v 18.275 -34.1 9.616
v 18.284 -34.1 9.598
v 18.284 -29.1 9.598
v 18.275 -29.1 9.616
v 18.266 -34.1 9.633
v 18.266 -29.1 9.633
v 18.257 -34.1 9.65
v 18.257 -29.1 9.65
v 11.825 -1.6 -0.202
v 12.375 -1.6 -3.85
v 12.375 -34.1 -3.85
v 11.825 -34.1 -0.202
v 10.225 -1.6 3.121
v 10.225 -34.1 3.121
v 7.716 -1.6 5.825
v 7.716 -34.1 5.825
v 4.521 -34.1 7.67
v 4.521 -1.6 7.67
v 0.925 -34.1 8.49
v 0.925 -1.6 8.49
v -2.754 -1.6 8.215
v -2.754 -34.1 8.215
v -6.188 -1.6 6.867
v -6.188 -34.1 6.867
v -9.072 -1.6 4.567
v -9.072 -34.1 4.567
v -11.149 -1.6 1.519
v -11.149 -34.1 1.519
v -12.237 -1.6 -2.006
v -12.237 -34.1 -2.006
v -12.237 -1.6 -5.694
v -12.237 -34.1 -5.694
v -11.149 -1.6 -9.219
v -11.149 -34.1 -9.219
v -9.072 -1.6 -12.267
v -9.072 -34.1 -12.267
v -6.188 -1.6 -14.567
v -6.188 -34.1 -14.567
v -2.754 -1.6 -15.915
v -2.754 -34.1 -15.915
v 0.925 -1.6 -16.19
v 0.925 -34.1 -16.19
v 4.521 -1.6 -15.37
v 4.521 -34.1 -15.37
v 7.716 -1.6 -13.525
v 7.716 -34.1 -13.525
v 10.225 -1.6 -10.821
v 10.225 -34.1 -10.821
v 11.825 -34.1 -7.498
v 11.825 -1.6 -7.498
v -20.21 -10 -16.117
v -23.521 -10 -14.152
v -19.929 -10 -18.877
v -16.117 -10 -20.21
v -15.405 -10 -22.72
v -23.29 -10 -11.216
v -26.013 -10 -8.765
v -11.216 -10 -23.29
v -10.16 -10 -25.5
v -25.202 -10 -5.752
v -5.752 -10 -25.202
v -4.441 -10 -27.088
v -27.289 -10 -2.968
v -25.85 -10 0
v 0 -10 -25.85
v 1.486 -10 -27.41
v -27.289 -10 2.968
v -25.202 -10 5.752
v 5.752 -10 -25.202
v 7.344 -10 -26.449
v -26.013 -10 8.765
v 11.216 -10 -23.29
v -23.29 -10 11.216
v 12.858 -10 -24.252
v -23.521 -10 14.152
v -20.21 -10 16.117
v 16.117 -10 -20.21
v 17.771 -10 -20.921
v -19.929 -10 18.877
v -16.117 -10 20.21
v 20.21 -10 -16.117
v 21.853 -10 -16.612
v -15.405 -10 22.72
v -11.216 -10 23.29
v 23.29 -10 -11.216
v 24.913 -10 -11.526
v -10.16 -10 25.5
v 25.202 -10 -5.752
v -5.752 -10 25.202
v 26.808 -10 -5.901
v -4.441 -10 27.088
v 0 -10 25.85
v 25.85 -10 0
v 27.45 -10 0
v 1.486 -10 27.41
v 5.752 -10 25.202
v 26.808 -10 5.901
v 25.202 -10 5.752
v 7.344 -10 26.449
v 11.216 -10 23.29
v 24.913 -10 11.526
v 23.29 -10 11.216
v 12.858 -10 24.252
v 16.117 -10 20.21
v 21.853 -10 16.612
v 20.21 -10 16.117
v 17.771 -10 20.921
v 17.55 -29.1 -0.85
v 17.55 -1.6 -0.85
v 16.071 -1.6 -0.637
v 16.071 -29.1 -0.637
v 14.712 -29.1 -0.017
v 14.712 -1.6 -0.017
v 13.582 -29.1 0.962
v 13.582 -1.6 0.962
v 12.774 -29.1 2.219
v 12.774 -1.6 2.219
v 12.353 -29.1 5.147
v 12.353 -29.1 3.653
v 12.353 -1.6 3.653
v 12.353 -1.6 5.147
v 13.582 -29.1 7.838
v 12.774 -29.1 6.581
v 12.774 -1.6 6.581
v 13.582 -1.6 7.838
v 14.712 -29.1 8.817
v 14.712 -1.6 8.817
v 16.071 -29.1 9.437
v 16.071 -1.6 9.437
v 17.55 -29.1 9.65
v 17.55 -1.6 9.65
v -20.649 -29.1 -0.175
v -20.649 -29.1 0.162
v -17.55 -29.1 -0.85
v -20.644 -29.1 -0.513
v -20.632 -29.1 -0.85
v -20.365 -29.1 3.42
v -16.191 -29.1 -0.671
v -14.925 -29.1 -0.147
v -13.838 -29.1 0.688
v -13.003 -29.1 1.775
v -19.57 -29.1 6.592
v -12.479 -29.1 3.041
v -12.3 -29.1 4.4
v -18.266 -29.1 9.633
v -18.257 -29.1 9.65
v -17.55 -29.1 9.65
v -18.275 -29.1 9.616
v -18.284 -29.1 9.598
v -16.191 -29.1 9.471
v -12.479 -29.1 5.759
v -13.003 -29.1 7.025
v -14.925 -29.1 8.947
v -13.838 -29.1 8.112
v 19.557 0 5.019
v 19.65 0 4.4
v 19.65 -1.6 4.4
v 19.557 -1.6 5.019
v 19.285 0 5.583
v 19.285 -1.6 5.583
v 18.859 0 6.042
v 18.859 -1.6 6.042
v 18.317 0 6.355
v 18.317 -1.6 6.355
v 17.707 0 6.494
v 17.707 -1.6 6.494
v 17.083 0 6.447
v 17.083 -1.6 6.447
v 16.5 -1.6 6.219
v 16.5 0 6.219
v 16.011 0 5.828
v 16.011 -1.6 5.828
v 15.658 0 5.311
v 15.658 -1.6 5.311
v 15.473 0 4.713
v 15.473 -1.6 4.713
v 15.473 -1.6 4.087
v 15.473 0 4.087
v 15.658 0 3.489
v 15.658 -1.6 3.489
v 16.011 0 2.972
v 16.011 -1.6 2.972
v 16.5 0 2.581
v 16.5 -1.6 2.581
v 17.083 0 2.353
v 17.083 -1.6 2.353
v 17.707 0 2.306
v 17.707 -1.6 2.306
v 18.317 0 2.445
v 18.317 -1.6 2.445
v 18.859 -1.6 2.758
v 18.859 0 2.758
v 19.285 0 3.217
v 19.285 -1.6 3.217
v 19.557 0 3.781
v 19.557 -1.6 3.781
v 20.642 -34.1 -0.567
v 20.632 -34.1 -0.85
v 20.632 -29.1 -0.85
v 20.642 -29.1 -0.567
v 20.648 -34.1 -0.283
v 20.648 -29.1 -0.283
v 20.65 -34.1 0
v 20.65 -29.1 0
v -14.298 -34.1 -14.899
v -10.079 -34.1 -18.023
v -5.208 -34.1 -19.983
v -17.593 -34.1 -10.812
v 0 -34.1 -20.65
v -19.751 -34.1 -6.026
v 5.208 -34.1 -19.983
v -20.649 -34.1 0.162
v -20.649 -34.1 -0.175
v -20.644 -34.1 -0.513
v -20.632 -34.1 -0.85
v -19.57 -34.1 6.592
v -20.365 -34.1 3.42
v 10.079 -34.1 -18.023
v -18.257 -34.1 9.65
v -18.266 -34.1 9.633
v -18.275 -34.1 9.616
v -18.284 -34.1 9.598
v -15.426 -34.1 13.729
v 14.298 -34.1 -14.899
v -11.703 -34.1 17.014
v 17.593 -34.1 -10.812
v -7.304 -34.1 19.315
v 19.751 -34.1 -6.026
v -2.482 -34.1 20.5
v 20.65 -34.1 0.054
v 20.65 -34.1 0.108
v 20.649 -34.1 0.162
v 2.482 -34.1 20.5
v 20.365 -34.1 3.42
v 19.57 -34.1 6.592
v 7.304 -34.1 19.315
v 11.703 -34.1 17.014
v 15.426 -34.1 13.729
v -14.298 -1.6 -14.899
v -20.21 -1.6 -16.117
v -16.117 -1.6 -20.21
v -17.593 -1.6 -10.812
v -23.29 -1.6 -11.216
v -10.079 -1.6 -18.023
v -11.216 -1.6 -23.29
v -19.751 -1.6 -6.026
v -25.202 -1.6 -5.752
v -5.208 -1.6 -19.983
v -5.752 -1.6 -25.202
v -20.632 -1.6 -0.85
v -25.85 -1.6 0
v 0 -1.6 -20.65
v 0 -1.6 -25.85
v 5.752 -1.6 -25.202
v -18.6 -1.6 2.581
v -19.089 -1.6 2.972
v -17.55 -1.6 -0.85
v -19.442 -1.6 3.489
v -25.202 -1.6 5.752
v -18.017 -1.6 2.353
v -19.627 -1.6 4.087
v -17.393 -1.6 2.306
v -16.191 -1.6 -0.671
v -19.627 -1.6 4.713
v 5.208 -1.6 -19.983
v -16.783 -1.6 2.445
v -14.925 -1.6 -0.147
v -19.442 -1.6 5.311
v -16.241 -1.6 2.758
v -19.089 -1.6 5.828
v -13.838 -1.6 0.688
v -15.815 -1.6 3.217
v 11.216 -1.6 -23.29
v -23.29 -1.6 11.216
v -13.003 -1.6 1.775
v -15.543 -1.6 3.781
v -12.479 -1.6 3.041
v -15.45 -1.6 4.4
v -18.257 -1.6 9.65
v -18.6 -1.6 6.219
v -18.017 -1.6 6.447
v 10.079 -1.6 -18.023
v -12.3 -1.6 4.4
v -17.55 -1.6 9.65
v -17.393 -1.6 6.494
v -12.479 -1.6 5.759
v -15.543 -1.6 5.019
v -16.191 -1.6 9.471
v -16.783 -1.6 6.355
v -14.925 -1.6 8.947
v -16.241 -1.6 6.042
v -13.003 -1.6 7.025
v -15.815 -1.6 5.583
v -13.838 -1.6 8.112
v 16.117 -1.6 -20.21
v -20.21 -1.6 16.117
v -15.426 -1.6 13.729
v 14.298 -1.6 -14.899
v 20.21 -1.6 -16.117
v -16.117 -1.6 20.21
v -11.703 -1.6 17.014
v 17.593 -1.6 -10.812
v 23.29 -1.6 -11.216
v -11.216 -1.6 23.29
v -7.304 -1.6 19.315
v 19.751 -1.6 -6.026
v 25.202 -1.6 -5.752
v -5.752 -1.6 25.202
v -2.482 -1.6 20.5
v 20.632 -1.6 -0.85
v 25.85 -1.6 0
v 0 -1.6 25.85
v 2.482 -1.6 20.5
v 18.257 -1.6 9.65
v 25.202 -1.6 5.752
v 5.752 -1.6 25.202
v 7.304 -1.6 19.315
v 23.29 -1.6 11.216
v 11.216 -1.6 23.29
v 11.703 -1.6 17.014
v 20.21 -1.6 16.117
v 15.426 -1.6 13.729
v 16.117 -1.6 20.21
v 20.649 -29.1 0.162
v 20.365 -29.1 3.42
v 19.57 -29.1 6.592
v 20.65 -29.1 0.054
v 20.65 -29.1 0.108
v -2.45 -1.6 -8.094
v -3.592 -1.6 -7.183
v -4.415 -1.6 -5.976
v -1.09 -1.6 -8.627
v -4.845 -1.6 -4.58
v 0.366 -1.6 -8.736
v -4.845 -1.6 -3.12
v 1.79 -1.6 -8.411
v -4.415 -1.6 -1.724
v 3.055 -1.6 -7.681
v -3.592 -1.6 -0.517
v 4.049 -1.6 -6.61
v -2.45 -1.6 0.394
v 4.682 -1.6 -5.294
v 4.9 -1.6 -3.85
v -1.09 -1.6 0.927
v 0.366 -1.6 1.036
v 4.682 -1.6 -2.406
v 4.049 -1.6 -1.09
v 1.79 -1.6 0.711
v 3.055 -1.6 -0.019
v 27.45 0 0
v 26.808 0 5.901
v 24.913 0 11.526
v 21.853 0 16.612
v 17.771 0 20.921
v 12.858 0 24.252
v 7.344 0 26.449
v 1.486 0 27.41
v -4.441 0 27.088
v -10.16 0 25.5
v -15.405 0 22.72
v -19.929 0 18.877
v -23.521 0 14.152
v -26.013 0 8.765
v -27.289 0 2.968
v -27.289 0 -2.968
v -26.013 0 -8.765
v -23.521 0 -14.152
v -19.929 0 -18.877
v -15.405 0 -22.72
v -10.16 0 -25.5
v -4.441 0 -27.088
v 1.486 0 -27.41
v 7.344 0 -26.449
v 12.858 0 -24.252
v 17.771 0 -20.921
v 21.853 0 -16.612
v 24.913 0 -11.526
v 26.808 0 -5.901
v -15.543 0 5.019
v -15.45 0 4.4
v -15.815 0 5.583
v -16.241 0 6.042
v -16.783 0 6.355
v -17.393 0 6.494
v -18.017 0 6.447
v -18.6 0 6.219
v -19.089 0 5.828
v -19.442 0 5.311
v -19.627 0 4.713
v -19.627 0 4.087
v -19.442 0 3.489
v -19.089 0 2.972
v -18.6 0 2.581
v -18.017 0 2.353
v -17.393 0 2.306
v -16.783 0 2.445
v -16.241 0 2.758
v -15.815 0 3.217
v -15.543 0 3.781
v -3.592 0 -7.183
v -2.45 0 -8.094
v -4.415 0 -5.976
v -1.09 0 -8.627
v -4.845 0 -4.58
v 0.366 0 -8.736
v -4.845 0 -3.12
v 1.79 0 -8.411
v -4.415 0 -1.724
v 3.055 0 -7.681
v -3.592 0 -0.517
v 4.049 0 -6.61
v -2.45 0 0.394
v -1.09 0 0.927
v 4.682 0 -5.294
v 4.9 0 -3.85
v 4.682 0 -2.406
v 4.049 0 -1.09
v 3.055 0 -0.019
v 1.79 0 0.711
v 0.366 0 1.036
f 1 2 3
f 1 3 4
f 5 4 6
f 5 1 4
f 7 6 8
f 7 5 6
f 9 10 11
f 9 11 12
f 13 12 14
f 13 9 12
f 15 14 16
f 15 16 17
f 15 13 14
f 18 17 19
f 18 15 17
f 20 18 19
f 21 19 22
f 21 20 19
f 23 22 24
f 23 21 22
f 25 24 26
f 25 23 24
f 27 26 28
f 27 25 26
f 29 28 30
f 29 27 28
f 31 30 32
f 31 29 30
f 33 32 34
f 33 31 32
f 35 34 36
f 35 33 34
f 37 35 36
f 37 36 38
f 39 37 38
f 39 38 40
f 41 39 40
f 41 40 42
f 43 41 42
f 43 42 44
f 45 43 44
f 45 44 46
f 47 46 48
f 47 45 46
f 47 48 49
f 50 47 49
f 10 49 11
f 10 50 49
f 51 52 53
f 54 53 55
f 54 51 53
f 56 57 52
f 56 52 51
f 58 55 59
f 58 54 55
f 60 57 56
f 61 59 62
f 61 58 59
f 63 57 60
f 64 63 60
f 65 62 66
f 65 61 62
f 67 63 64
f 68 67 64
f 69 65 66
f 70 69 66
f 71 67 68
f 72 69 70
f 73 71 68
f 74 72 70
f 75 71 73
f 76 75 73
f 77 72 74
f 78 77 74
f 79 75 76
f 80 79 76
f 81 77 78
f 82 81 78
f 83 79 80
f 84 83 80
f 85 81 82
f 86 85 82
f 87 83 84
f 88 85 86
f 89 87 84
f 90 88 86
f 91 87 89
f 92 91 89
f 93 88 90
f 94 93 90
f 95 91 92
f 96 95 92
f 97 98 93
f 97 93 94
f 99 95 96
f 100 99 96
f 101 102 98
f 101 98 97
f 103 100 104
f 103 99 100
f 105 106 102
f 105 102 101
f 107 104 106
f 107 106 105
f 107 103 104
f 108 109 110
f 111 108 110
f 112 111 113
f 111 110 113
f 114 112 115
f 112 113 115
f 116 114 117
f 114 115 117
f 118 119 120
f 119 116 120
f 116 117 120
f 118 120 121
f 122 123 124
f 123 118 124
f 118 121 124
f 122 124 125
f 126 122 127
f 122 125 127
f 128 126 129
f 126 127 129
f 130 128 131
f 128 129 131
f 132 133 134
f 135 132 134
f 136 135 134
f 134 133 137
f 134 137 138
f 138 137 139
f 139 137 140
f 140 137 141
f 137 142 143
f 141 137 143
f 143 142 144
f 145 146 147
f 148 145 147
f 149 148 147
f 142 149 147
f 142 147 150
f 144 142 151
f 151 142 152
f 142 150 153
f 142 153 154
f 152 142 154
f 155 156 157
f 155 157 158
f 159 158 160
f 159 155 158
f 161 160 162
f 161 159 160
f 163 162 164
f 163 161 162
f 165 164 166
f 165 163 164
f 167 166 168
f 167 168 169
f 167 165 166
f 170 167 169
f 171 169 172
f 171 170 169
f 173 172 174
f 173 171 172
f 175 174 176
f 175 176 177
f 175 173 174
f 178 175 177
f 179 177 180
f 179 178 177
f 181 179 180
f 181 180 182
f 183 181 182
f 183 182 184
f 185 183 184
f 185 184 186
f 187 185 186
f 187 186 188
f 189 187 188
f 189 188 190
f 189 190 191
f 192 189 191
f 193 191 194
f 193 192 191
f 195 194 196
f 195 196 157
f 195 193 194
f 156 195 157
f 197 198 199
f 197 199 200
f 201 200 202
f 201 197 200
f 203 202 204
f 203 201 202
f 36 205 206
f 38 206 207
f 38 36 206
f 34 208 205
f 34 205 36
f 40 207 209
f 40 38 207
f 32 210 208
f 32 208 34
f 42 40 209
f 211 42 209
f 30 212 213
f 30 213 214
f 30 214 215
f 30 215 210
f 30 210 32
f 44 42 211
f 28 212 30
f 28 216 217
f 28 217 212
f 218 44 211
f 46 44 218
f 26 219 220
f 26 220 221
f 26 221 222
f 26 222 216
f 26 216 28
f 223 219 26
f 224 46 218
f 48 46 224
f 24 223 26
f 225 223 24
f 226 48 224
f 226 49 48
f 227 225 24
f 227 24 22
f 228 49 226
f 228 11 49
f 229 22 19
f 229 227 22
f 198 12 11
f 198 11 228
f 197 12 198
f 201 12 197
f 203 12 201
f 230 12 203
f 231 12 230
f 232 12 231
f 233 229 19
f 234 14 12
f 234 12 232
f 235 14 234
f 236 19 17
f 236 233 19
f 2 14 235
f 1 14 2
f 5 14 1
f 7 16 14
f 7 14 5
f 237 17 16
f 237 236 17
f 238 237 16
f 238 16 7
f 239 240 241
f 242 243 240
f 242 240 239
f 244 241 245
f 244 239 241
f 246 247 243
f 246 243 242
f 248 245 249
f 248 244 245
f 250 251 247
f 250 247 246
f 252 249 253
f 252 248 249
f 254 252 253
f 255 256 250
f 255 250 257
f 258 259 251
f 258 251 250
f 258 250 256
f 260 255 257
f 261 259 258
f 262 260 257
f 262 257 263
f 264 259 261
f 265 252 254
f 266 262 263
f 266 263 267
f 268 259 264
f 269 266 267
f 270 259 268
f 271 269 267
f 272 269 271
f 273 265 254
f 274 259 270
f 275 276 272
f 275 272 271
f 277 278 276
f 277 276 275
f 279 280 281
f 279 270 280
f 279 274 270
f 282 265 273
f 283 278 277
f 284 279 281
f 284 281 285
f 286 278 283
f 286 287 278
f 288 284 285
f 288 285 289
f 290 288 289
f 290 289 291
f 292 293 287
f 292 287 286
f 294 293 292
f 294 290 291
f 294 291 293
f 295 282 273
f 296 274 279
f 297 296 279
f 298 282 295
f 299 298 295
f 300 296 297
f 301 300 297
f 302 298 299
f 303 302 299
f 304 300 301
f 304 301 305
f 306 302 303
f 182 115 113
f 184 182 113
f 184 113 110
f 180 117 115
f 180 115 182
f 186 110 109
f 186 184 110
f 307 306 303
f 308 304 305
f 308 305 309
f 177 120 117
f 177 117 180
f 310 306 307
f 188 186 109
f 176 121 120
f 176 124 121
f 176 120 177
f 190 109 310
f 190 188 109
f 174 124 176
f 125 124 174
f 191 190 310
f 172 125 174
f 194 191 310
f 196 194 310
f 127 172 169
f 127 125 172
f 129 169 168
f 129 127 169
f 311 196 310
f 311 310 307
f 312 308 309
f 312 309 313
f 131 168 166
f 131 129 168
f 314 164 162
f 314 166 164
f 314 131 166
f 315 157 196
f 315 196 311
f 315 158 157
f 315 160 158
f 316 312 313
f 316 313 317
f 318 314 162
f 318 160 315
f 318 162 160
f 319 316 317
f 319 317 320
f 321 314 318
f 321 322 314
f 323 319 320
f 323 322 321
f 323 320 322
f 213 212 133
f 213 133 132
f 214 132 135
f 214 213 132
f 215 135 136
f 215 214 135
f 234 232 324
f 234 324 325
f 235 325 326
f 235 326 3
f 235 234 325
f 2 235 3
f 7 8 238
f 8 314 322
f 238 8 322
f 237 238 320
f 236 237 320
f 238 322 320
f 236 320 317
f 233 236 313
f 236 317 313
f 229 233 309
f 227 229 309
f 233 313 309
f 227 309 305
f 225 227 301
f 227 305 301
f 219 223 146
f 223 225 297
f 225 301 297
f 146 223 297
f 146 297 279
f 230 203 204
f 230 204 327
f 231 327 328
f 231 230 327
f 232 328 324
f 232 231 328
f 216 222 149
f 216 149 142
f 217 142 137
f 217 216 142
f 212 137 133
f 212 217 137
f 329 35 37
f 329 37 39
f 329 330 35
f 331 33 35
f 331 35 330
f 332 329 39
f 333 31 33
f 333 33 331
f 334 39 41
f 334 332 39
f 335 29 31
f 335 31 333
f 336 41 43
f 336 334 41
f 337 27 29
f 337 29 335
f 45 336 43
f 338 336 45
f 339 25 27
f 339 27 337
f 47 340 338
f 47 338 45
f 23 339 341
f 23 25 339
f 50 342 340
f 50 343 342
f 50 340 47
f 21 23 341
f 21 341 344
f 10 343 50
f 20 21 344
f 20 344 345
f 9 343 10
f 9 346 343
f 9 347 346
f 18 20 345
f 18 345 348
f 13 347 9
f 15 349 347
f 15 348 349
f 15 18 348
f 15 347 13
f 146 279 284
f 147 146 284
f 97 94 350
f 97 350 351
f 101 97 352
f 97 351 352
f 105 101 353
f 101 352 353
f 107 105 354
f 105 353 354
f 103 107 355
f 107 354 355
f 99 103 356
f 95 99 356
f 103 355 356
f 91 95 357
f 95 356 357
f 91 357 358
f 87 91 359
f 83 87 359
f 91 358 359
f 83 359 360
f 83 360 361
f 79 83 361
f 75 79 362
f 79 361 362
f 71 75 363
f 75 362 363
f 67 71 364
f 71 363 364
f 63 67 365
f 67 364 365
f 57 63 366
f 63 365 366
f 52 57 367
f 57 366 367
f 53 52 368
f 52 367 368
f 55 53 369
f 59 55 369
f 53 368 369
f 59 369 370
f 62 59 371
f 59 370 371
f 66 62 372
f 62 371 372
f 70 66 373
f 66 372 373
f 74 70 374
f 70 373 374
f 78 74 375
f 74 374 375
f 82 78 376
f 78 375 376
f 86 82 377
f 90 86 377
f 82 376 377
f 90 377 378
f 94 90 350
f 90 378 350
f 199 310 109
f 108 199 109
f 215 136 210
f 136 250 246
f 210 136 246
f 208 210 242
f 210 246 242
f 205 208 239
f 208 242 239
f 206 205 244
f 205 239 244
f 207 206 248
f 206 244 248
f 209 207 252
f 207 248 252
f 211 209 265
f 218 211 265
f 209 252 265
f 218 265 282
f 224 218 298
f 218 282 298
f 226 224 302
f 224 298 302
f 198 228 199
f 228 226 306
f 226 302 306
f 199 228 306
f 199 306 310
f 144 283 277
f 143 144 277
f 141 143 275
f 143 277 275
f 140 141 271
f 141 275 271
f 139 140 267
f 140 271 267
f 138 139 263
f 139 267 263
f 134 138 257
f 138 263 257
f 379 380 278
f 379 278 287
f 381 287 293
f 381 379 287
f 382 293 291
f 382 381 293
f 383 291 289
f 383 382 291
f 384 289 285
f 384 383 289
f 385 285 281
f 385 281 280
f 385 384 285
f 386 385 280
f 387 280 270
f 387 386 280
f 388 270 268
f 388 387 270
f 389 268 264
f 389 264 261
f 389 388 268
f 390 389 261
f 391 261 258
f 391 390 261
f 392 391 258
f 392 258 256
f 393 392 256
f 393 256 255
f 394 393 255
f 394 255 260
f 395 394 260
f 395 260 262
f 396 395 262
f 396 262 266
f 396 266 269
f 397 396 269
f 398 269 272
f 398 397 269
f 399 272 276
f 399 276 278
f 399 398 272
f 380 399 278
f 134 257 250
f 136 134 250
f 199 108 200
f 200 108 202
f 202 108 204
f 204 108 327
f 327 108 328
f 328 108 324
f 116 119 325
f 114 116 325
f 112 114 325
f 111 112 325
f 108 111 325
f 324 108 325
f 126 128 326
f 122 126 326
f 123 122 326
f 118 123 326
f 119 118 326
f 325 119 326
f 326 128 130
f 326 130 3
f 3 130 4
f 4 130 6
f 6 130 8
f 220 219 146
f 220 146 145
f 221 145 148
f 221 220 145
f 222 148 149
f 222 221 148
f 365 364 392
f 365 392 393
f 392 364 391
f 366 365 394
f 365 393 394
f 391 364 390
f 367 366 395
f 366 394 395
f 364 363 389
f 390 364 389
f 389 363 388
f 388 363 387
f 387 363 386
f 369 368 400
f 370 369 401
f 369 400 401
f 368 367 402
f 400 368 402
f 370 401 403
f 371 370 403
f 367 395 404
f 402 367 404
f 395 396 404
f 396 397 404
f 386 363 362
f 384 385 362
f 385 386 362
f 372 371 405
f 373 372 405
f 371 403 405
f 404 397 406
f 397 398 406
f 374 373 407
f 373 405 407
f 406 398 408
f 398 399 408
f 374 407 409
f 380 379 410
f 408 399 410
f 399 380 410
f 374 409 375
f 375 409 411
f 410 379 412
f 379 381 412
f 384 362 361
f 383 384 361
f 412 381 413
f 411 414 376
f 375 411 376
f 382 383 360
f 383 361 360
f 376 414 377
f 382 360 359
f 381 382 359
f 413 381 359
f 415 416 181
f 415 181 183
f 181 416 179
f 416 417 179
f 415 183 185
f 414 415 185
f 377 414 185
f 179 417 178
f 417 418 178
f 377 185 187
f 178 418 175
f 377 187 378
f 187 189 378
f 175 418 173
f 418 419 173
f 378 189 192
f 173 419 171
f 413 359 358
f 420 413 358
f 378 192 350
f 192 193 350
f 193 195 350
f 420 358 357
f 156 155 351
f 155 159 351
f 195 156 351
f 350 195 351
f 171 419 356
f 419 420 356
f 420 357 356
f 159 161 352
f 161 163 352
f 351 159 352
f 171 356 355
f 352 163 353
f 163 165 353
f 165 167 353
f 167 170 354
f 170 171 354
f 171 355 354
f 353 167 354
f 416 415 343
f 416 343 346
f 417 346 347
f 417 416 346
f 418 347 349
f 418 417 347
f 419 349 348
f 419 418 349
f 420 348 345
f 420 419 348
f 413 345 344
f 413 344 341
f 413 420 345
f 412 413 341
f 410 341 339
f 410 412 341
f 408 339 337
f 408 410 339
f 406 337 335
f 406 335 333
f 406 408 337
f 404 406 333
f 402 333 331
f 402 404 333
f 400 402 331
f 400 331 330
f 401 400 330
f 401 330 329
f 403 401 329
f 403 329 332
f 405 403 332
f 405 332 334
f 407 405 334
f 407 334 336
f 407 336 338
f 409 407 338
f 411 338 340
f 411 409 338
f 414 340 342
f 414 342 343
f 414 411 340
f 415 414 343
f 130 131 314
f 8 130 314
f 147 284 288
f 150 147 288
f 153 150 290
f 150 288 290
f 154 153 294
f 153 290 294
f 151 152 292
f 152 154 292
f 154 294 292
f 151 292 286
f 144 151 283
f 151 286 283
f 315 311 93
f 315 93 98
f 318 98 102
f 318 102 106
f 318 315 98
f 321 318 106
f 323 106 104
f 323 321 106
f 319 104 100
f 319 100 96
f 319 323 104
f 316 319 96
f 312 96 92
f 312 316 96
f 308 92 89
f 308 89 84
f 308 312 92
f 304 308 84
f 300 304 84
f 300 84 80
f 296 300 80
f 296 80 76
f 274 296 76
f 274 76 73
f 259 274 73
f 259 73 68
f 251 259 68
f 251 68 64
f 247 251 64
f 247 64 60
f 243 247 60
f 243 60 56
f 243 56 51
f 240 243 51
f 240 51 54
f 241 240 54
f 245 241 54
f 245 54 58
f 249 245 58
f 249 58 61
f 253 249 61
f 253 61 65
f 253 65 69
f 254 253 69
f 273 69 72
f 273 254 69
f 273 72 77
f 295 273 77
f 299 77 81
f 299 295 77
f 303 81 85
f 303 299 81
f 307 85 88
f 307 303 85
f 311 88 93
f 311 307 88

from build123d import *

# Parameters (mm, degrees)
F0_R     = 25.85
F0_R_2   = 4.9
F0_R_3   = 2.1
F1_DEPTH = 1.6
F0_R_4   = 27.45
F2_DEPTH = 10
F3_R     = 12.375
F4_DEPTH = 32.5
F6_DEPTH = 5


# Not quite as in the source:
# - ends of sketch curves that miss each other by under 0.0002 mm in the source are joined


with BuildPart() as f1:
    # F0 (on Front) → F1 (new body)
    with BuildSketch(Plane.XZ):
        Circle(F0_R)
        with Locations((0, -3.85)):
            Circle(F0_R_2, mode=Mode.SUBTRACT)
        with Locations((-17.55, 4.4)):
            Circle(F0_R_3, mode=Mode.SUBTRACT)
        with Locations((17.55, 4.4)):
            Circle(F0_R_3, mode=Mode.SUBTRACT)
    extrude(amount=F1_DEPTH)

    # F0 (on Front) → F2 (join)
    with BuildSketch(Plane.XZ):
        Circle(F0_R_4)
        Circle(F0_R, mode=Mode.SUBTRACT)
    extrude(amount=F2_DEPTH)

    # F3 (on face) → F4 (join)
    with BuildSketch(Plane.XZ.offset(1.6)):
        with BuildLine():
            Line((17.55, 9.65), (18.2565056898, 9.65))
            ThreePointArc((18.2565056898, 9.65), (0, 20.65), (-18.2565056898, 9.65))
            Line((-18.2565056898, 9.65), (-17.55, 9.65))
            ThreePointArc((-17.55, 9.65), (-13.8376893988, 8.1123106012), (-12.3, 4.4))
            ThreePointArc((-12.3, 4.4), (-13.8376893988, 0.6876893988), (-17.55, -0.85))
            Line((-17.55, -0.85), (-20.6324986369, -0.85))
            ThreePointArc((-20.6324986369, -0.85), (0, -20.65), (20.6324986369, -0.85))
            Line((20.6324986369, -0.85), (17.55, -0.85))
            ThreePointArc((17.55, -0.85), (12.3, 4.4), (17.55, 9.65))
        make_face()
        with Locations((0, -3.85)):
            Circle(F3_R, mode=Mode.SUBTRACT)
    extrude(amount=F4_DEPTH)

    # F5 (on face) → F6 (join)
    with BuildSketch(Plane.XZ.offset(34.1)):
        with BuildLine():
            ThreePointArc((-17.55, -0.85), (-13.8376893988, 0.6876893988), (-12.3, 4.4))
            ThreePointArc((-12.3, 4.4), (-13.8376893988, 8.1123106012), (-17.55, 9.65))
            ThreePointArc((-17.55, 9.65), (-17.9177743439, 9.6371024462), (-18.2837416824, 9.598473155))
            ThreePointArc((-18.2837416824, 9.598473155), (-20.0300885135, 5.0217580727), (-20.6493606667, 0.1624932498))
            ThreePointArc((-20.6493606667, 0.1624932498), (-19.1802744495, -0.5904614235), (-17.55, -0.85))
        make_face()
        with BuildLine():
            ThreePointArc((-18.2837416824, 9.598473155), (-17.9177743439, 9.6371024462), (-17.55, 9.65))
            Line((-17.55, 9.65), (-18.2565056898, 9.65))
            ThreePointArc((-18.2565056898, 9.65), (-18.2701054669, 9.6242270457), (-18.2837416824, 9.598473155))
        make_face()
        with BuildLine():
            Line((-20.6324986369, -0.85), (-17.55, -0.85))
            ThreePointArc((-17.55, -0.85), (-19.1802744495, -0.5904614235), (-20.6493606667, 0.1624932498))
            ThreePointArc((-20.6493606667, 0.1624932498), (-20.6471369089, -0.3438567505), (-20.6324986369, -0.85))
        make_face()
        with BuildLine():
            ThreePointArc((20.6493606667, 0.1624932498), (20.0300885135, 5.0217580727), (18.2836688601, 9.5984349253))
            ThreePointArc((18.2836688601, 9.5984349253), (17.9177743439, 9.6371024462), (17.55, 9.65))
            ThreePointArc((17.55, 9.65), (12.3, 4.4), (17.55, -0.85))
            ThreePointArc((17.55, -0.85), (19.1802744495, -0.5904614235), (20.6493606667, 0.1624932498))
        make_face()
        with BuildLine():
            Line((17.55, -0.85), (20.6324986369, -0.85))
            ThreePointArc((20.6324986369, -0.85), (20.6456241956, -0.425090078), (20.65, 0))
            ThreePointArc((20.65, 0), (20.6498401661, 0.0812472538), (20.6493606667, 0.1624932498))
            ThreePointArc((20.6493606667, 0.1624932498), (19.1802744495, -0.5904614235), (17.55, -0.85))
        make_face()
        with BuildLine():
            ThreePointArc((18.2836688601, 9.5984349253), (18.2701054669, 9.6242270457), (18.2565056898, 9.65))
            Line((18.2565056898, 9.65), (17.55, 9.65))
            ThreePointArc((17.55, 9.65), (17.9177743439, 9.6371024462), (18.2836688601, 9.5984349253))
        make_face()
    extrude(amount=-F6_DEPTH)


solid = f1.part
